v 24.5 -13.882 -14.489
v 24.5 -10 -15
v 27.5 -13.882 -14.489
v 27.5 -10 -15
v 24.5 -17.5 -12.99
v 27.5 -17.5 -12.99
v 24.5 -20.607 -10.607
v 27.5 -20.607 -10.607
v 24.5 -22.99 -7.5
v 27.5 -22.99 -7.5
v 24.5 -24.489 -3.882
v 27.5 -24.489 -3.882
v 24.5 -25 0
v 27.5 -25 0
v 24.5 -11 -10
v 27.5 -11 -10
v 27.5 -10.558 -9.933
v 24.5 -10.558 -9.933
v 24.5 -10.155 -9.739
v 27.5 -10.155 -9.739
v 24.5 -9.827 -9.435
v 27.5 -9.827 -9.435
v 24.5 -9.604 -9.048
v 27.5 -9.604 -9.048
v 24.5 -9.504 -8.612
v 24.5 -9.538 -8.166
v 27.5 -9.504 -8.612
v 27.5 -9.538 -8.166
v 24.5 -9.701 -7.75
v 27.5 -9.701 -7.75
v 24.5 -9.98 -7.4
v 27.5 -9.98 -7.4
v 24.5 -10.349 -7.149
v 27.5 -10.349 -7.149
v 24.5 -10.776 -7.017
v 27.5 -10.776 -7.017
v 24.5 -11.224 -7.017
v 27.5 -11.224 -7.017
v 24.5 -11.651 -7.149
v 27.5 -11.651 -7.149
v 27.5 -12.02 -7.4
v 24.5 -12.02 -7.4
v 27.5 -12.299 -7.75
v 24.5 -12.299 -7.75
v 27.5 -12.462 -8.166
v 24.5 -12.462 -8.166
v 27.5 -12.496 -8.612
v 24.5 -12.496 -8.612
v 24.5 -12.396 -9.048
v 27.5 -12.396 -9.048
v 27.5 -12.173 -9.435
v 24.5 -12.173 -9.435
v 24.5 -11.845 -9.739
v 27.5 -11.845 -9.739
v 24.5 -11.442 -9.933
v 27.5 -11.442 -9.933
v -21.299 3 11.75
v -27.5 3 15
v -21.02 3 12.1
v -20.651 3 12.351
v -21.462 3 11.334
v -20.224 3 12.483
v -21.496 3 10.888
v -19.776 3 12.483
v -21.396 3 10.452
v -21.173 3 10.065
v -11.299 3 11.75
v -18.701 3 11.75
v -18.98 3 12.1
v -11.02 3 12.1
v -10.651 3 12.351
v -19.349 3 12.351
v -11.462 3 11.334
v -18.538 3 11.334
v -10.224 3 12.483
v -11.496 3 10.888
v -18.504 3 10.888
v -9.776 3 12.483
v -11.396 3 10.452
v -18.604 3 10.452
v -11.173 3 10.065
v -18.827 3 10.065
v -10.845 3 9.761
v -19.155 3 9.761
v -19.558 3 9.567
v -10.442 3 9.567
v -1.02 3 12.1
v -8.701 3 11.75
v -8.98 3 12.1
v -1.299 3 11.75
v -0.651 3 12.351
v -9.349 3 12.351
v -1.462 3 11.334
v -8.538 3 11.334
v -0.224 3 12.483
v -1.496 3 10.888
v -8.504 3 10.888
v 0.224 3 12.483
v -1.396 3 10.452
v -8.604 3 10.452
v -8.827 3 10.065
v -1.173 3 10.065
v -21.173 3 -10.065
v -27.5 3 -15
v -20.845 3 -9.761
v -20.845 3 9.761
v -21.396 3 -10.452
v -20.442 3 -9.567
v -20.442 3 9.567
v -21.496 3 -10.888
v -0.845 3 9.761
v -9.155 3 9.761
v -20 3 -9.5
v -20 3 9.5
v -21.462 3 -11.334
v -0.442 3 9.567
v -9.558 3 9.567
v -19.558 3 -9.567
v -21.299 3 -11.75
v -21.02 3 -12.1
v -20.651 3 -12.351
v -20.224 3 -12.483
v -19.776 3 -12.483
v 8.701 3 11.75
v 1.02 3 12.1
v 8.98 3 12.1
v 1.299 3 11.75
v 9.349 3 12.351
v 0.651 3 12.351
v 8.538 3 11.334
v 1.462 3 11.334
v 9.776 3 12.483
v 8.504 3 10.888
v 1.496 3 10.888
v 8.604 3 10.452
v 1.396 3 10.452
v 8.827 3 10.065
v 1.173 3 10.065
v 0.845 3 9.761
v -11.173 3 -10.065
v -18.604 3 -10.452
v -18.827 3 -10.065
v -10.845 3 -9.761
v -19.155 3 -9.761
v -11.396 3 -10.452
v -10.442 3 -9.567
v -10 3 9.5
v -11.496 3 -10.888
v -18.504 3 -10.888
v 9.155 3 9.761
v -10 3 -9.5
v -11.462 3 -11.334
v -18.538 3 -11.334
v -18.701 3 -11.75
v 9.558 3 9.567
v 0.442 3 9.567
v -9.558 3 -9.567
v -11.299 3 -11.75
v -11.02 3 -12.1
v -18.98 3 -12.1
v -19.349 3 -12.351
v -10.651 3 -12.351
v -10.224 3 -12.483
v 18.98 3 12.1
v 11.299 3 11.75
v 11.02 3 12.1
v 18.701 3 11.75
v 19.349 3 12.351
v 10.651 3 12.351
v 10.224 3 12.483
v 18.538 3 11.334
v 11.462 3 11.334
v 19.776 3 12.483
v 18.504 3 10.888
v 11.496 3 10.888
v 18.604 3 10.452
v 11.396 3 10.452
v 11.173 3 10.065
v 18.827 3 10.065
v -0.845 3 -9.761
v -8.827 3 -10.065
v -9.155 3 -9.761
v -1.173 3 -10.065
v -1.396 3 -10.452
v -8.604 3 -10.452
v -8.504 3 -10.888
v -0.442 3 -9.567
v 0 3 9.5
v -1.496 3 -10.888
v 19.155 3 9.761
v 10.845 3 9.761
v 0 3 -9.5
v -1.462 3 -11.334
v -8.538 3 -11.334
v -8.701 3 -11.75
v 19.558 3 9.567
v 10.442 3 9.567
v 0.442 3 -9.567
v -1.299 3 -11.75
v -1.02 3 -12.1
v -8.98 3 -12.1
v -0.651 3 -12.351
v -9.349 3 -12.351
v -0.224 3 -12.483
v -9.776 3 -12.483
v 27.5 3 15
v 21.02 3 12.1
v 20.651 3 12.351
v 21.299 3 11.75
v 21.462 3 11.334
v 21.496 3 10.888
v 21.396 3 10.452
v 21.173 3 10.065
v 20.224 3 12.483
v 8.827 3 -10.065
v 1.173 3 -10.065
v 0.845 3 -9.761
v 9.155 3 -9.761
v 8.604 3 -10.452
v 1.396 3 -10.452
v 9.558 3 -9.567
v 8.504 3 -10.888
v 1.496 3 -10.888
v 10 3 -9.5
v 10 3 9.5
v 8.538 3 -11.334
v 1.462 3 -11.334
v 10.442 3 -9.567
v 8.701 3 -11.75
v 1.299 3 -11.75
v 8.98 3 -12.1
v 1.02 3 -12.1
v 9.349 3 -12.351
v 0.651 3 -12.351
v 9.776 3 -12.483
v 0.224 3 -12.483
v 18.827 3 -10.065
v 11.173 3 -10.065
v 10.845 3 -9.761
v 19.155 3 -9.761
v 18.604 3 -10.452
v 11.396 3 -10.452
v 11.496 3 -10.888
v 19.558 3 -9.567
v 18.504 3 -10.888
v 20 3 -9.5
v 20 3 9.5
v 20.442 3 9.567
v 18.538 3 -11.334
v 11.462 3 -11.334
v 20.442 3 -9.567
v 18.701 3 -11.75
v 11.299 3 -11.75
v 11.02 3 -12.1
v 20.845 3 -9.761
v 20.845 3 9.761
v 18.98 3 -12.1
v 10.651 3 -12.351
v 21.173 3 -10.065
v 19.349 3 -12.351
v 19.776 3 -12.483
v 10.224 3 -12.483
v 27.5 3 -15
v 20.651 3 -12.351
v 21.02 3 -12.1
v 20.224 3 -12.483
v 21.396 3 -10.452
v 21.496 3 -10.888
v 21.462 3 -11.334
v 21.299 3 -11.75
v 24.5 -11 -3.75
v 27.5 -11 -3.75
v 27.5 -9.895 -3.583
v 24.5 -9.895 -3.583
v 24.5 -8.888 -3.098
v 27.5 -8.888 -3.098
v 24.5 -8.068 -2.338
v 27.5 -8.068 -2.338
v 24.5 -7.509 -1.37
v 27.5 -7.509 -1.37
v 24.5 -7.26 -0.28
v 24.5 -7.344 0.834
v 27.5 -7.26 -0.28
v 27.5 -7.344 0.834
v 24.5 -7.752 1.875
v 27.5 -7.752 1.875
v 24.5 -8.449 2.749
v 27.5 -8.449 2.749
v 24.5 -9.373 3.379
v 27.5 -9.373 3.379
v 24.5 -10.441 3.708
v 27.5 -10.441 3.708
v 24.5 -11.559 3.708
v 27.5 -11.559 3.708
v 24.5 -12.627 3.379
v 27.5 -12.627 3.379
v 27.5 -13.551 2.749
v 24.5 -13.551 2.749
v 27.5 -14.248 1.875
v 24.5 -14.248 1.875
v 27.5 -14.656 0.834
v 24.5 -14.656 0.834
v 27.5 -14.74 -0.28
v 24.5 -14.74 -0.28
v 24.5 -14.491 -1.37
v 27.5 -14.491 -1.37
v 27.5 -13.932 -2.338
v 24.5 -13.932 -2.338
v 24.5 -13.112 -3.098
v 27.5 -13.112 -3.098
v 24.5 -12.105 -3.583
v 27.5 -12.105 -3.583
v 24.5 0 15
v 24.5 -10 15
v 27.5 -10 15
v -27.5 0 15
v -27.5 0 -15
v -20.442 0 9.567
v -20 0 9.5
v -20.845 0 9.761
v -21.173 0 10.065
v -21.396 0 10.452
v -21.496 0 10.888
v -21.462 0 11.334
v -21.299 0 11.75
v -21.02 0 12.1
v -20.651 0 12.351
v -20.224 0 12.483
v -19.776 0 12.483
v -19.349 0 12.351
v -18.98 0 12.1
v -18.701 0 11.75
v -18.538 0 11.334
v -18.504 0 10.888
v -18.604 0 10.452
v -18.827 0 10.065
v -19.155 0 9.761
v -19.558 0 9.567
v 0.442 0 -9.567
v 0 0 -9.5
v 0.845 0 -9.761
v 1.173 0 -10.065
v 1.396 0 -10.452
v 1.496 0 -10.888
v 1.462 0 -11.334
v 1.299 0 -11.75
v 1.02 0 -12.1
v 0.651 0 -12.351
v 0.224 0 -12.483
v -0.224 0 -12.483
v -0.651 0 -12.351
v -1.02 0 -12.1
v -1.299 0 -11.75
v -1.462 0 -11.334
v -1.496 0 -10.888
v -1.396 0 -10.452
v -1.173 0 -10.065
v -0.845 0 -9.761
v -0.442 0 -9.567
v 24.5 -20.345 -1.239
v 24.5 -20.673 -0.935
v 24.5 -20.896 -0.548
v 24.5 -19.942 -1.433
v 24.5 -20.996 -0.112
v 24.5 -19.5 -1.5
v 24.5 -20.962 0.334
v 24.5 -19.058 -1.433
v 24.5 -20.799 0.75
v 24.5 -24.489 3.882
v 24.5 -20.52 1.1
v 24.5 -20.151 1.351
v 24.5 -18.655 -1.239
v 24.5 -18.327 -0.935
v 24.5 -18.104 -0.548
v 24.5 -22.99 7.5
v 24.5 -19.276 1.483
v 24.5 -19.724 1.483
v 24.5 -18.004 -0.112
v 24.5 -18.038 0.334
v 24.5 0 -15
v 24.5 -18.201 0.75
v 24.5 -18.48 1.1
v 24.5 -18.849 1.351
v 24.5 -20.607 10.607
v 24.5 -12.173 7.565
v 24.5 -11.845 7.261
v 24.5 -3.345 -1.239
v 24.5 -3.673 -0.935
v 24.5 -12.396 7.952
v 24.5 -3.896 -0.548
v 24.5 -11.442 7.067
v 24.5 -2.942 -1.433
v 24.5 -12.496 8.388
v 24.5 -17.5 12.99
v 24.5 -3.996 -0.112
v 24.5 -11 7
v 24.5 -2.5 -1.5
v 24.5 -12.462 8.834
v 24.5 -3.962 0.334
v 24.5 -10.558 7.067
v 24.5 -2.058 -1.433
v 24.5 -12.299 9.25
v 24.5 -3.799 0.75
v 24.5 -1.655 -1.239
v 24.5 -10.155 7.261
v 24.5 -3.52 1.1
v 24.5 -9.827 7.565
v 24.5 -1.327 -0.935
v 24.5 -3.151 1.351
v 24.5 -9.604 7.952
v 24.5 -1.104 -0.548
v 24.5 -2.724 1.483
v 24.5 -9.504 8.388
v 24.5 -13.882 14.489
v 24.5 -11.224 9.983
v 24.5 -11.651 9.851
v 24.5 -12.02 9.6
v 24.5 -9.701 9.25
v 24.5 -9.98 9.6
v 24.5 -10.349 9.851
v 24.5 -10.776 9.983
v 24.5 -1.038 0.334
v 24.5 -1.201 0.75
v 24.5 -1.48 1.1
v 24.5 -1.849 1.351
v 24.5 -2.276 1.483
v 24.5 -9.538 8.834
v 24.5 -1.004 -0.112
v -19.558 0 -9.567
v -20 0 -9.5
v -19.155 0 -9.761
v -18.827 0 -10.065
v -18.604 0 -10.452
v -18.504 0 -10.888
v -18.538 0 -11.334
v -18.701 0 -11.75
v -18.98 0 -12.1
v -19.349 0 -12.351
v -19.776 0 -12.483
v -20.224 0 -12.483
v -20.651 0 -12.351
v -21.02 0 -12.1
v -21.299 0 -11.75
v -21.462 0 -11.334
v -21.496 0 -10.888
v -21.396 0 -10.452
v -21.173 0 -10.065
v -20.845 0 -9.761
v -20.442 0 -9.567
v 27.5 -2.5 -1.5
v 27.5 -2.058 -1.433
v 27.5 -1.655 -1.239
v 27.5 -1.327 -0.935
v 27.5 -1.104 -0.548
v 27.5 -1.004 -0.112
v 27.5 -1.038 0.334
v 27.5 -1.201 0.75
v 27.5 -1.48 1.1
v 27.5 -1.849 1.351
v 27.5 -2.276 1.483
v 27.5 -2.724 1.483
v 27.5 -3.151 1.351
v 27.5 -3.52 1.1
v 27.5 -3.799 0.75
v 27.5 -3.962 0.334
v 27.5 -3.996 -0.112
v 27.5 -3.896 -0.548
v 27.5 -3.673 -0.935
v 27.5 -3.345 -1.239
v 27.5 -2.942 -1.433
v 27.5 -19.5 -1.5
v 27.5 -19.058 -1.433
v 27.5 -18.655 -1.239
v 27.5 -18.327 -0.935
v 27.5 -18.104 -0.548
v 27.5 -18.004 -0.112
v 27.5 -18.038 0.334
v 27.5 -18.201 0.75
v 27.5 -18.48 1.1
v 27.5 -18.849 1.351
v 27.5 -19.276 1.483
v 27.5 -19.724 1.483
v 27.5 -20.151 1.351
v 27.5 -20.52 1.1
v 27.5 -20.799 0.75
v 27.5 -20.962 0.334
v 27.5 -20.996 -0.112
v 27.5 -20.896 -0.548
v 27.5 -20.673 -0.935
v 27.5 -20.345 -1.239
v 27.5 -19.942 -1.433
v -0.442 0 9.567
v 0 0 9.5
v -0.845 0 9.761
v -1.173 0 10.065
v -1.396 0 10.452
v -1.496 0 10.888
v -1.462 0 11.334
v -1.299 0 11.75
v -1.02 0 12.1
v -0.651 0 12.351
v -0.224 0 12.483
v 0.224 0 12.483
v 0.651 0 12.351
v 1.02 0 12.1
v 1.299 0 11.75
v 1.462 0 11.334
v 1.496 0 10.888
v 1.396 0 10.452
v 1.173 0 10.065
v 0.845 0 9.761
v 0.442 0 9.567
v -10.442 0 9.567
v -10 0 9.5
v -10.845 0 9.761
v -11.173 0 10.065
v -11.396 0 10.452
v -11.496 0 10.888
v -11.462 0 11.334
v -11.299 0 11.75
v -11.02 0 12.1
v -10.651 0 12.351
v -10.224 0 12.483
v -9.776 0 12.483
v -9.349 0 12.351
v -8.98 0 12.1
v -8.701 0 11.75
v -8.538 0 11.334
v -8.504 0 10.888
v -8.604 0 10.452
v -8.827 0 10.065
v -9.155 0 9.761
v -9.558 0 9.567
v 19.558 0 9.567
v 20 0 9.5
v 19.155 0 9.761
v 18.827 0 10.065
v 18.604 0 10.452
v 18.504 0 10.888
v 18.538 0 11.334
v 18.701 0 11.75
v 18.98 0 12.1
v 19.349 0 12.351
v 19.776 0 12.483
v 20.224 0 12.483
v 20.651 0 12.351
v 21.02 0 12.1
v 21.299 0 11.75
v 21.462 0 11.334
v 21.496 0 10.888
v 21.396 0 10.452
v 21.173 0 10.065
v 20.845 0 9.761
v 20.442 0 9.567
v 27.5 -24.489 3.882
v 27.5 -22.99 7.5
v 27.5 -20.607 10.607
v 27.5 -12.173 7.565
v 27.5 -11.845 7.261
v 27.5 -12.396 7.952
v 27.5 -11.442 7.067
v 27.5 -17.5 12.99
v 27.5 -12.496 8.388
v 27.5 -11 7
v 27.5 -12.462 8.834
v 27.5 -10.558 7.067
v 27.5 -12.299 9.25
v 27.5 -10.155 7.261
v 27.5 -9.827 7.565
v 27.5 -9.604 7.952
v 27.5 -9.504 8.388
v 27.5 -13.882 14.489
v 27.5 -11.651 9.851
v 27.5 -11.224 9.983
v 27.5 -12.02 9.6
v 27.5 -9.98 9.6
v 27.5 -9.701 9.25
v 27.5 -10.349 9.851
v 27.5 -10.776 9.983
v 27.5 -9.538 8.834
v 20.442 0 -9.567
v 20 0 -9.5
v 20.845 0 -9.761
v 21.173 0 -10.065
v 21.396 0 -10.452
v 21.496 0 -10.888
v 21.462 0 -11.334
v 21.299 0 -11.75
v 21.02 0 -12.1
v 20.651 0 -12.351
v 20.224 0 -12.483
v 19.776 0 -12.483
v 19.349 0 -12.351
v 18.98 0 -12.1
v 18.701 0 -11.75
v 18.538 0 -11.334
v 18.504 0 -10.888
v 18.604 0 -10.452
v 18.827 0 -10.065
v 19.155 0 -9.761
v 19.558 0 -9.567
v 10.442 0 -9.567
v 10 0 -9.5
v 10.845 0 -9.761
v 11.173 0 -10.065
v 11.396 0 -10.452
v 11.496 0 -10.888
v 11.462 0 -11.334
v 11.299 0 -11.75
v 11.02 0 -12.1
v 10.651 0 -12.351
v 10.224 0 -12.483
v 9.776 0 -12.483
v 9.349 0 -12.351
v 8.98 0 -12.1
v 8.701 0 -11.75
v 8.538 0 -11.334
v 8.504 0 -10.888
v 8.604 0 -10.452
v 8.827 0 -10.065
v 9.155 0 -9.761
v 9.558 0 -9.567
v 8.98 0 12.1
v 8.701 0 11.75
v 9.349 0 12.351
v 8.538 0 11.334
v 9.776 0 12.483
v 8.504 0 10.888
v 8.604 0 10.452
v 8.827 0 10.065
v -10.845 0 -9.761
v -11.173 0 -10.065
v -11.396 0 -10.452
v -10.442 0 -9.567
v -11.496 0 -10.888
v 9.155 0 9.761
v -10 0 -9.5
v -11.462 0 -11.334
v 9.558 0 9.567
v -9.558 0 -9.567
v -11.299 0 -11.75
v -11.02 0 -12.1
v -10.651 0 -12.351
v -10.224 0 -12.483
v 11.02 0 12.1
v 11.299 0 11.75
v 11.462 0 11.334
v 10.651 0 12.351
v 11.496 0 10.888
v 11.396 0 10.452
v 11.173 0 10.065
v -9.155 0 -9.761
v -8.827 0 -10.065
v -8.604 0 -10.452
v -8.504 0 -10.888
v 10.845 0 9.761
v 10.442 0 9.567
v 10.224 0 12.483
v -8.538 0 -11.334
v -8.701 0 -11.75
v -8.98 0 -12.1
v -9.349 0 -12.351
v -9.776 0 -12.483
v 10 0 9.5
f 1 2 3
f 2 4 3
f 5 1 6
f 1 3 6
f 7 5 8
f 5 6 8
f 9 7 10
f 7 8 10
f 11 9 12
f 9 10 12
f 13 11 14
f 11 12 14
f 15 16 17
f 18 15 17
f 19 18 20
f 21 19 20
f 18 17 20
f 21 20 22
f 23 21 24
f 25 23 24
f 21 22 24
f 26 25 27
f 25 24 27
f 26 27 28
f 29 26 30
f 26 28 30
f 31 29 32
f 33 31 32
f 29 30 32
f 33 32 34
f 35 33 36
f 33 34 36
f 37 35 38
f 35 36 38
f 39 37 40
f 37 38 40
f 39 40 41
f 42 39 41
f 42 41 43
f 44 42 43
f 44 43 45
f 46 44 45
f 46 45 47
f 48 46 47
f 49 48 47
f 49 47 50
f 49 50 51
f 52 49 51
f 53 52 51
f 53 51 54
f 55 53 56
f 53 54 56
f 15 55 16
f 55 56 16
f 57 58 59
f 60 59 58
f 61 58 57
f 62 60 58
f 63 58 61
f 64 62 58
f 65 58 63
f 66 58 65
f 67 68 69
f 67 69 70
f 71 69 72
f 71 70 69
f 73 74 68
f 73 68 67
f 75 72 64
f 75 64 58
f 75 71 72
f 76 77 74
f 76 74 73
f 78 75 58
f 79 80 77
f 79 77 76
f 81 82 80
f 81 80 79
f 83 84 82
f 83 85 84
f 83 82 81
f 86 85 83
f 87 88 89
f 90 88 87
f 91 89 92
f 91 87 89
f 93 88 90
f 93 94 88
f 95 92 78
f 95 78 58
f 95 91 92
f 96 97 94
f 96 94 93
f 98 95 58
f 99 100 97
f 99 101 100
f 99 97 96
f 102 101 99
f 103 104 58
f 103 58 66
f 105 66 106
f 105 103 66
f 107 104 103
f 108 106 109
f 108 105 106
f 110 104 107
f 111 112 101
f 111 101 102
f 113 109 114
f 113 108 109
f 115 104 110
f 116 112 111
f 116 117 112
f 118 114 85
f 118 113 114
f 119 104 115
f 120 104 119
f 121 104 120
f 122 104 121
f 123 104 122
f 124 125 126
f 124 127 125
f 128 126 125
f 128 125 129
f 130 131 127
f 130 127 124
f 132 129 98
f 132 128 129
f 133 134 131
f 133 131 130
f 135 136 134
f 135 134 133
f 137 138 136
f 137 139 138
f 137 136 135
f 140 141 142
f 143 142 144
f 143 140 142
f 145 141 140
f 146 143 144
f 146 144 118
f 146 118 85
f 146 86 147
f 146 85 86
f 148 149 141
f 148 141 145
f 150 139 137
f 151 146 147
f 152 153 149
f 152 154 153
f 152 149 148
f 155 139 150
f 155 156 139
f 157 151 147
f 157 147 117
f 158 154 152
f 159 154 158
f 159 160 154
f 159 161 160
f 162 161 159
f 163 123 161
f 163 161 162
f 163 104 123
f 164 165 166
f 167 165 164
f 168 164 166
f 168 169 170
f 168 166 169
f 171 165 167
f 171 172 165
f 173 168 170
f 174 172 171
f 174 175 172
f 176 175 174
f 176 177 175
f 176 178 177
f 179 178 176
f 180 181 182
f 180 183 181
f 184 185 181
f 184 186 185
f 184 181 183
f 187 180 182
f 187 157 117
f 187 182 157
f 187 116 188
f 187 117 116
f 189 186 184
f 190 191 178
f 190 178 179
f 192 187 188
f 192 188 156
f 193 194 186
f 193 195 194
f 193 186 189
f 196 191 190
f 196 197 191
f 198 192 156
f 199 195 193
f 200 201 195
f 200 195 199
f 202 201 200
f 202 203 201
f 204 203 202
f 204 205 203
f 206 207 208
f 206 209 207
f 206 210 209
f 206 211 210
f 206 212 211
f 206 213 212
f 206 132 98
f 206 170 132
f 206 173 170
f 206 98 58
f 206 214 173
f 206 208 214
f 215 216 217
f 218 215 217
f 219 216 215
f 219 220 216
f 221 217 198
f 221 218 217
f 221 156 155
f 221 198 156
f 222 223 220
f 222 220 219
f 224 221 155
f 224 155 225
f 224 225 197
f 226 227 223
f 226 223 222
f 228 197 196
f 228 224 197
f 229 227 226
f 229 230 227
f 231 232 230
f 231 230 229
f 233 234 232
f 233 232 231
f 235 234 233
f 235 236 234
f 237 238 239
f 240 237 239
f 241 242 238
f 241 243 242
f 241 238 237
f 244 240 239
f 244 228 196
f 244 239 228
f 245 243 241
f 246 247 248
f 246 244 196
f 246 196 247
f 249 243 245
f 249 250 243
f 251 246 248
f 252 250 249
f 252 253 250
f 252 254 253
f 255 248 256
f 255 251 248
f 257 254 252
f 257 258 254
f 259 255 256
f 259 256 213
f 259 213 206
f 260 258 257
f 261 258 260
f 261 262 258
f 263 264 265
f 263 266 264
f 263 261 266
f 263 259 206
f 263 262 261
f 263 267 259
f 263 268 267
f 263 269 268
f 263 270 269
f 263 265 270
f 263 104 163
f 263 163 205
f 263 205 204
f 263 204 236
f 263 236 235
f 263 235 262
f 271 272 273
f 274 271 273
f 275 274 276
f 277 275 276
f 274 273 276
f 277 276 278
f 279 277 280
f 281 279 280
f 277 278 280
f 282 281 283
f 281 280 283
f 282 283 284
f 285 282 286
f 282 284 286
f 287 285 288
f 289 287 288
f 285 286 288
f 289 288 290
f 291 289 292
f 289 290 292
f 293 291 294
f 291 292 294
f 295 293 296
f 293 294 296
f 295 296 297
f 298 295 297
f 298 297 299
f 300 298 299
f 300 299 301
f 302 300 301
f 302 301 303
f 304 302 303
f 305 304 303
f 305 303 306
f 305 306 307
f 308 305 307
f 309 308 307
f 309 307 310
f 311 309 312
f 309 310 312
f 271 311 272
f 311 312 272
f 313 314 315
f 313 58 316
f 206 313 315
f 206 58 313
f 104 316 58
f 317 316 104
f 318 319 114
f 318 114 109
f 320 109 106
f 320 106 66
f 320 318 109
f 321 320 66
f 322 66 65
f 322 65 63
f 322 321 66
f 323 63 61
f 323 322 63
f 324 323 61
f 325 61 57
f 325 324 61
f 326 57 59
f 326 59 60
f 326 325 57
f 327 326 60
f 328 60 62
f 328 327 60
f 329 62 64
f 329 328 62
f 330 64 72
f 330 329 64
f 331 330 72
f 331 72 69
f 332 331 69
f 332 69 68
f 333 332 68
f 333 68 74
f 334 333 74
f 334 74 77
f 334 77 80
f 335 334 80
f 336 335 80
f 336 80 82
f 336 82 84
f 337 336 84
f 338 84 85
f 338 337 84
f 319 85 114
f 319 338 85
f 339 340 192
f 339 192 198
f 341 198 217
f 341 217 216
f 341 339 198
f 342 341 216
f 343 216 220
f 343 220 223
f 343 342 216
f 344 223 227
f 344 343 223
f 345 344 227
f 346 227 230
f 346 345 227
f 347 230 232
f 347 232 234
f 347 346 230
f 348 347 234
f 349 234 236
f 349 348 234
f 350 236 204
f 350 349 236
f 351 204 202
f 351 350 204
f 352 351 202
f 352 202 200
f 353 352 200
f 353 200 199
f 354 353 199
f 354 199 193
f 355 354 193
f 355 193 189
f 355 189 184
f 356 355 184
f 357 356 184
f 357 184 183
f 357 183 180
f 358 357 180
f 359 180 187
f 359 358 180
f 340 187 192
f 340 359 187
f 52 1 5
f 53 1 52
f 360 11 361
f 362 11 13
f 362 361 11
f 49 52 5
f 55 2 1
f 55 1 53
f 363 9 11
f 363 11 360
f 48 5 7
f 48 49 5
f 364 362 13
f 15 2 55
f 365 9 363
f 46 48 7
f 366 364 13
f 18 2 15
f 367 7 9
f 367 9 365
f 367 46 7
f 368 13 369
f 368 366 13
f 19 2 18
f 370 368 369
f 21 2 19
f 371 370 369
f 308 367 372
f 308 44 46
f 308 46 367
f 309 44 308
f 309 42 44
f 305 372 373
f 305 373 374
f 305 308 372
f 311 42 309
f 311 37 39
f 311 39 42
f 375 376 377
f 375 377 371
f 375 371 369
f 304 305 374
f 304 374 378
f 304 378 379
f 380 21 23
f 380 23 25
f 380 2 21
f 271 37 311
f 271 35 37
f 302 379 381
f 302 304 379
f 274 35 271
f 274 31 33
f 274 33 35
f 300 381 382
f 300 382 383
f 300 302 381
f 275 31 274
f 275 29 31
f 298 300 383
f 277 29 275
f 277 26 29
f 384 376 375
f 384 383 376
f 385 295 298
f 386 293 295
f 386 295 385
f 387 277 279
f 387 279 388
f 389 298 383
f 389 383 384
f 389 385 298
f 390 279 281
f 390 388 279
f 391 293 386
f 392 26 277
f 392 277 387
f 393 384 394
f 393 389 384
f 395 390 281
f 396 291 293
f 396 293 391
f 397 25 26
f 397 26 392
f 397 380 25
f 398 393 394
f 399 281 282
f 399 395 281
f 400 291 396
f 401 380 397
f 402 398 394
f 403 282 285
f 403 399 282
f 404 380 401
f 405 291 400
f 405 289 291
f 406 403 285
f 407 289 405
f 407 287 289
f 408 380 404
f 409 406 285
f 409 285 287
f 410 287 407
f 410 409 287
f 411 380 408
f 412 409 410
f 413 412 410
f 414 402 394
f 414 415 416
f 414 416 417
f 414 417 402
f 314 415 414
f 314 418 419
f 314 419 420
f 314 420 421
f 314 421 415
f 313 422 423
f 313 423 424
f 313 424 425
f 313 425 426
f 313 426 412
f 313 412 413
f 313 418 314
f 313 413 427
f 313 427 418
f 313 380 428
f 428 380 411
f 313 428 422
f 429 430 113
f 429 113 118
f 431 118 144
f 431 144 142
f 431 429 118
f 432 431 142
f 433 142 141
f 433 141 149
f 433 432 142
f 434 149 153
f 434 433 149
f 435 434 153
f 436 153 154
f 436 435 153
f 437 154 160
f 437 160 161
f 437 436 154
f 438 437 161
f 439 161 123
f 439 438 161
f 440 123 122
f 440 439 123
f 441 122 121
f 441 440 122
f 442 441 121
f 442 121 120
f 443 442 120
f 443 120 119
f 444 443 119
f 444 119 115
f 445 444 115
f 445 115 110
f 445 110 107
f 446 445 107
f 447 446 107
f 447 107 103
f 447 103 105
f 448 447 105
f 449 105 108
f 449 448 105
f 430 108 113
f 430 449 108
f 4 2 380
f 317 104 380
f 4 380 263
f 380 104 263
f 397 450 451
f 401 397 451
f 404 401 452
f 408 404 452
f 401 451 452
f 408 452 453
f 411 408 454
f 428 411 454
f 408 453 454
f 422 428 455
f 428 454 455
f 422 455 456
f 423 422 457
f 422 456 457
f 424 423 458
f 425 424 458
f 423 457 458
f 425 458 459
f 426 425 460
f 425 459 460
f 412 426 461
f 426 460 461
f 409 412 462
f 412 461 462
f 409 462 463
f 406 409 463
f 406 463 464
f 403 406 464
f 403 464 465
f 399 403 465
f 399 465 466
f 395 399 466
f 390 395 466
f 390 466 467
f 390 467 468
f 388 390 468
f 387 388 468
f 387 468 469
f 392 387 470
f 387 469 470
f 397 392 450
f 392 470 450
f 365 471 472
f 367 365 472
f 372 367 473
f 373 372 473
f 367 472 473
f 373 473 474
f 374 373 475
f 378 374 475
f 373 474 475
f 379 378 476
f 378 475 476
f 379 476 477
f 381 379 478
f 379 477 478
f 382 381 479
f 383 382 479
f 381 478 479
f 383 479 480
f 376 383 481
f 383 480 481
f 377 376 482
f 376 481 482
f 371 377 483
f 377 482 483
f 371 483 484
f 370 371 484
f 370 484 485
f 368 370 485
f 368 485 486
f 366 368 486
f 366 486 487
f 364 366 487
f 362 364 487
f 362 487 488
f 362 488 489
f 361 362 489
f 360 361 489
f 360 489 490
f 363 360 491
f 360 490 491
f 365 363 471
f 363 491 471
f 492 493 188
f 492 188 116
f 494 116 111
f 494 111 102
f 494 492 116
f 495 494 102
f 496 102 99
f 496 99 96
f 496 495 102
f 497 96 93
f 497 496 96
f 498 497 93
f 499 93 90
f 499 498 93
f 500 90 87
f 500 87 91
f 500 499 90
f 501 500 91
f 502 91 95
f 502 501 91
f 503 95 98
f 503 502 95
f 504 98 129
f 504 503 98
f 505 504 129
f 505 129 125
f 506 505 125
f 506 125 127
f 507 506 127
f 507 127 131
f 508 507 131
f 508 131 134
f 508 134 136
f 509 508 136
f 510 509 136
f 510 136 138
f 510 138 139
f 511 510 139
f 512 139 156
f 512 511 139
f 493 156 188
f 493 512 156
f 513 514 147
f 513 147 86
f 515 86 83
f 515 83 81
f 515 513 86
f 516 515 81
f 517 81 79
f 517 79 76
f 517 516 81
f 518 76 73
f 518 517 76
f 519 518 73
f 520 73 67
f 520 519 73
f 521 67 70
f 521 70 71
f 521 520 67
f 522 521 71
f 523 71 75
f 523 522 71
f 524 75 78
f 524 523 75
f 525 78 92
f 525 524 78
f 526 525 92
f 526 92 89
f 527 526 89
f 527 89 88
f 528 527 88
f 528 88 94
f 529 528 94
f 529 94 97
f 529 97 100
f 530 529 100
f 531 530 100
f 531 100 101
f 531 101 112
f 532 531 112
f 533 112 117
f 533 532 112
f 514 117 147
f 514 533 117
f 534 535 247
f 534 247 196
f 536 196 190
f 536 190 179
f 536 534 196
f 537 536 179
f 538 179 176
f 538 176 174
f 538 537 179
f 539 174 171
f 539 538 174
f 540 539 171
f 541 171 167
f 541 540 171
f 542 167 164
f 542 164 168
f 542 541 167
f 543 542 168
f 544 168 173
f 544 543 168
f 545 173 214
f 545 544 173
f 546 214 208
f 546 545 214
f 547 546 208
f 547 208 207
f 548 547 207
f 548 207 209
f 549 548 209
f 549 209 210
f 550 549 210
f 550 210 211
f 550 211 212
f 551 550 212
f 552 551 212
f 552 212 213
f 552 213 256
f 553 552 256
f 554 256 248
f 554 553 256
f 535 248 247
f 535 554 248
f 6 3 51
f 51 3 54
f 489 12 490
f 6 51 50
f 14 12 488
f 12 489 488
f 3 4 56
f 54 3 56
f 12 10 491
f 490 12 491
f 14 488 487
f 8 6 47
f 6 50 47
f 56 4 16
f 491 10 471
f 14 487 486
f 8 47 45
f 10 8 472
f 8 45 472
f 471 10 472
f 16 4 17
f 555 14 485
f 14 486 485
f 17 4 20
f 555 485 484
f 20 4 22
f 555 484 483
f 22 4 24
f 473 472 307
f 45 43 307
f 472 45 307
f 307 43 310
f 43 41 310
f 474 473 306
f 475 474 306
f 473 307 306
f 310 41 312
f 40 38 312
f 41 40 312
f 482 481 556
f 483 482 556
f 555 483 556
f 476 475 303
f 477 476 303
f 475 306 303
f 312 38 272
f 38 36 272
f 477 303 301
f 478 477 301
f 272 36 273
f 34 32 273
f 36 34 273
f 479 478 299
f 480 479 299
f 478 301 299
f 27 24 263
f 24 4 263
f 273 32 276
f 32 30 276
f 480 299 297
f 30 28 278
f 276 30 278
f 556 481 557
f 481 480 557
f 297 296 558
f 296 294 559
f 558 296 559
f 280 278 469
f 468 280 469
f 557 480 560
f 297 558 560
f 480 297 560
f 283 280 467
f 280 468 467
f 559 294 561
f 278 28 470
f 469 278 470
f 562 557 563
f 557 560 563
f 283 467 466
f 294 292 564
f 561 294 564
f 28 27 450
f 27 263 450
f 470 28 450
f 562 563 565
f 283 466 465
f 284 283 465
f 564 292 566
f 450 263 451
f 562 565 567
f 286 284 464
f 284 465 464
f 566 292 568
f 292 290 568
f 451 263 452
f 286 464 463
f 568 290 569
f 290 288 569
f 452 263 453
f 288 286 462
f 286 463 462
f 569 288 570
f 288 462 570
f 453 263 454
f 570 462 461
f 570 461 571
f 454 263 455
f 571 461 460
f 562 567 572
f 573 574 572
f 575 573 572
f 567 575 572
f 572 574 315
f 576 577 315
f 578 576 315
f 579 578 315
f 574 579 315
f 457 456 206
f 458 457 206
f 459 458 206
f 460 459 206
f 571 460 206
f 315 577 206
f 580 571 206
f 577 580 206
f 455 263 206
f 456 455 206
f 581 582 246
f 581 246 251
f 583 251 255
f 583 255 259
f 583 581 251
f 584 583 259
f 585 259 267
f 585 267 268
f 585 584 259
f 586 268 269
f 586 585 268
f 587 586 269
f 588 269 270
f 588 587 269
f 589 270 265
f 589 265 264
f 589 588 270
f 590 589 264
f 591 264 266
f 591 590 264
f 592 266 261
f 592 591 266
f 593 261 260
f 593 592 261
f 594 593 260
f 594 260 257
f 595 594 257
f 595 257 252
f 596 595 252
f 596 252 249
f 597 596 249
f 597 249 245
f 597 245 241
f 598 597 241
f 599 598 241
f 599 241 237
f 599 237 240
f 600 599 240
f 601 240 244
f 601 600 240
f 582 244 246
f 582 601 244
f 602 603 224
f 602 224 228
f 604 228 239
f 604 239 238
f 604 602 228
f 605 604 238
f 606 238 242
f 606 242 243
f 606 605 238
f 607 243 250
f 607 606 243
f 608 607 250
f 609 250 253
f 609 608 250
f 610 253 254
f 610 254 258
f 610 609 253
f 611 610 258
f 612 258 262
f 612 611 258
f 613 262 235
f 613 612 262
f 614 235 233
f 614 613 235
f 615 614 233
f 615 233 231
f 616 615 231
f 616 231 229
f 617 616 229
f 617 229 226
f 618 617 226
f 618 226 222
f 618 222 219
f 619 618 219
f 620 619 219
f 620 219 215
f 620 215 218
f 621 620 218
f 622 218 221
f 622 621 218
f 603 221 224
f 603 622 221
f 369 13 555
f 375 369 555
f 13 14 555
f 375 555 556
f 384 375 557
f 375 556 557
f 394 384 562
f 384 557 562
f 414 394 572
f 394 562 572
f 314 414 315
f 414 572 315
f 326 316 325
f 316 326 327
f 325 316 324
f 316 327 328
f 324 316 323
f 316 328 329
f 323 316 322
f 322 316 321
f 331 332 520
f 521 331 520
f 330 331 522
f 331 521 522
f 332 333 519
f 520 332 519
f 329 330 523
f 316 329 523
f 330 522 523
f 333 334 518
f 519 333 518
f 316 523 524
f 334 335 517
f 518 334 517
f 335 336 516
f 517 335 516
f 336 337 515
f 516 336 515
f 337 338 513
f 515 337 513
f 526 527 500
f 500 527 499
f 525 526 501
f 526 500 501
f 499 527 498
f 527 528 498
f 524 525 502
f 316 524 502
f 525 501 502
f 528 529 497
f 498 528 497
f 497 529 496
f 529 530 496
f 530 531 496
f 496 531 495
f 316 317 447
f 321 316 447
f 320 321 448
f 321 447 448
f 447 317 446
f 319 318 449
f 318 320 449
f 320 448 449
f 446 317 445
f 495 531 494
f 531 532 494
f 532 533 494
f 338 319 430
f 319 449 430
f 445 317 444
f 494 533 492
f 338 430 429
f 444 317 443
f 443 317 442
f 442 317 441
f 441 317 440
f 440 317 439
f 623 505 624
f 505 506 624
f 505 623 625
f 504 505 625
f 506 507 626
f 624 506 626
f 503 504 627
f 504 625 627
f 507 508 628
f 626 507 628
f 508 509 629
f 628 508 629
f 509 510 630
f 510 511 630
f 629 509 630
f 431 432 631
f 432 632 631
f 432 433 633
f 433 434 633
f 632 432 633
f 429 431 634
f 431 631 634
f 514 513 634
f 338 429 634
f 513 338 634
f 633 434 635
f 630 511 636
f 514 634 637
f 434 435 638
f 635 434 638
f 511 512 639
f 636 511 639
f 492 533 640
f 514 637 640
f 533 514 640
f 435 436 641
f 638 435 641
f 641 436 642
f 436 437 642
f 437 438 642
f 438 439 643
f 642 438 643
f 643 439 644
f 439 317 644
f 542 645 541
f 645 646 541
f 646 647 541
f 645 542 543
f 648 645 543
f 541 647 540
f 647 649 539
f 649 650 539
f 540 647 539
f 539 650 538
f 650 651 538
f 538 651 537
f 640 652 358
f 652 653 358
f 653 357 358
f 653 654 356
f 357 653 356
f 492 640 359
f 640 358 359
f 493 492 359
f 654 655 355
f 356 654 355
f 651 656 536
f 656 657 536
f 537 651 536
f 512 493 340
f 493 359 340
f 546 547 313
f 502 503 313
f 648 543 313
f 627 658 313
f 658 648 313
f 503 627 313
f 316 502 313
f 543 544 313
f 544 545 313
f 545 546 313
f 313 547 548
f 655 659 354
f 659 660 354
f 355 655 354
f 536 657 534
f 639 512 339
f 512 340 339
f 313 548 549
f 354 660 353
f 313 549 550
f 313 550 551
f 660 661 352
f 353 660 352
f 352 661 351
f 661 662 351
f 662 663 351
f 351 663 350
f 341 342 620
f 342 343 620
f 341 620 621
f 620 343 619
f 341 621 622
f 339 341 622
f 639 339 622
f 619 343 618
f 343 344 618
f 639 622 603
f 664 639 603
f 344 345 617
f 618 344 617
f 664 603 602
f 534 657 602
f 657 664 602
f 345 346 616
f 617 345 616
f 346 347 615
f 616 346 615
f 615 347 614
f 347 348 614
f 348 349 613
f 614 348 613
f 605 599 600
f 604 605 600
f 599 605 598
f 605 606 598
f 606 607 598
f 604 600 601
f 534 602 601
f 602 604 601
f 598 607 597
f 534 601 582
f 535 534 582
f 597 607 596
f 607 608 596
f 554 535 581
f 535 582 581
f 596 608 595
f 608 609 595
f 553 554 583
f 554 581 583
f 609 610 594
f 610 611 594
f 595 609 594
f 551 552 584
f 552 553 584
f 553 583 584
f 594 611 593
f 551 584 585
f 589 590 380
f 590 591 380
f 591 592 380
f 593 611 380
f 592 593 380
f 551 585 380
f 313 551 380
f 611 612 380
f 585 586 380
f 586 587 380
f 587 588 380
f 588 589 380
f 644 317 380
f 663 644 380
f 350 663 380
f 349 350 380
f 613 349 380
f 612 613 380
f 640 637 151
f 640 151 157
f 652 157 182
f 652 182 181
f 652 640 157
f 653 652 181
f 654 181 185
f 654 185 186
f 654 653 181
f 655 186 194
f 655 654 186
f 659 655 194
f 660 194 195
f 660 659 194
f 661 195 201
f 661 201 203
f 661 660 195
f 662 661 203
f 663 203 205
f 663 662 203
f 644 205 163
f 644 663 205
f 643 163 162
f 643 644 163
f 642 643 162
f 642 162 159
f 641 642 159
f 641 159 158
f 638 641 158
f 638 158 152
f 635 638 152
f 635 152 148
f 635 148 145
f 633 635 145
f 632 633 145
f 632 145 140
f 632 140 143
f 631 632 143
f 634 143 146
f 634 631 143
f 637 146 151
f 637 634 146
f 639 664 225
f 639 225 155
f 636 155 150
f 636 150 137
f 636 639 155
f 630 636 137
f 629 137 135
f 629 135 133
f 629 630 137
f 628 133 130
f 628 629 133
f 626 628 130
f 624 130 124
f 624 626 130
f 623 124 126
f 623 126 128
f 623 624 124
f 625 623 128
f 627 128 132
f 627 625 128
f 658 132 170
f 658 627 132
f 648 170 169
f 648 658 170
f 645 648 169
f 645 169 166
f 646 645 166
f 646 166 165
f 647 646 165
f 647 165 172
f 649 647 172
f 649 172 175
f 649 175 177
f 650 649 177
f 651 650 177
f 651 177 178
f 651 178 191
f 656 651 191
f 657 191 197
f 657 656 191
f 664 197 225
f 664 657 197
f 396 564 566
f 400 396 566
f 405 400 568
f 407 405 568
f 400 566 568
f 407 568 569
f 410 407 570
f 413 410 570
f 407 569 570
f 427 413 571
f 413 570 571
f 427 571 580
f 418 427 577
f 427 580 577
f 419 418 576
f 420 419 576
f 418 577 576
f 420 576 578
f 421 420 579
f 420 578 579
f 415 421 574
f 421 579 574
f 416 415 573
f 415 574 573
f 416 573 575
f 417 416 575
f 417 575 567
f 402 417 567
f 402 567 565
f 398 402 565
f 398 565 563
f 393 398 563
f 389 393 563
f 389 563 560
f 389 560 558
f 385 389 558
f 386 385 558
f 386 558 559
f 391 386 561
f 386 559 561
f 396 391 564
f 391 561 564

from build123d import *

# Parameters (mm, degrees)
SKETCH1_W           = 55
SKETCH1_H           = 30
SKETCH1_R           = 1.5
BOSS_EXTRUDE1_DEPTH = 3
SKETCH2_W           = 3
SKETCH2_H           = 30
BOSS_EXTRUDE2_DEPTH = 25
SKETCH3_R           = 1.5
SKETCH3_R_2         = 3.75
CUT_EXTRUDE1_DEPTH  = 3
FILLET1_R           = 15


with BuildPart() as part:
    # Sketch1 → Boss-Extrude1 (new body)
    with BuildSketch(Plane(origin=(0, 0, 0), x_dir=(1, 0, 0), z_dir=(0, 1, 0))):
        Rectangle(SKETCH1_W, SKETCH1_H)
        with Locations(Location((20, 11, 0), (0, 0, 270))):
            Circle(SKETCH1_R, mode=Mode.SUBTRACT)
        with Locations(Location((10, 11, 0), (0, 0, 270))):
            Circle(SKETCH1_R, mode=Mode.SUBTRACT)
        with Locations(Location((0, 11, 0), (0, 0, 270))):
            Circle(SKETCH1_R, mode=Mode.SUBTRACT)
        with Locations(Location((-10, 11, 0), (0, 0, 270))):
            Circle(SKETCH1_R, mode=Mode.SUBTRACT)
        with Locations(Location((-20, 11, 0), (0, 0, 270))):
            Circle(SKETCH1_R, mode=Mode.SUBTRACT)
        with Locations(Location((20, -11, 0), (0, 0, 90))):
            Circle(SKETCH1_R, mode=Mode.SUBTRACT)
        with Locations(Location((10, -11, 0), (0, 0, 90))):
            Circle(SKETCH1_R, mode=Mode.SUBTRACT)
        with Locations(Location((0, -11, 0), (0, 0, 90))):
            Circle(SKETCH1_R, mode=Mode.SUBTRACT)
        with Locations(Location((-10, -11, 0), (0, 0, 90))):
            Circle(SKETCH1_R, mode=Mode.SUBTRACT)
        with Locations(Location((-20, -11, 0), (0, 0, 90))):
            Circle(SKETCH1_R, mode=Mode.SUBTRACT)
    extrude(amount=BOSS_EXTRUDE1_DEPTH)

    # Sketch2 → Boss-Extrude2 (add)
    with BuildSketch(Plane.XZ):
        with Locations((26, 0)):
            Rectangle(SKETCH2_W, SKETCH2_H)
    extrude(amount=BOSS_EXTRUDE2_DEPTH)

    # Sketch3 → Cut-Extrude1 (cut)
    with BuildSketch(Plane(origin=(27.5, 0, 0), x_dir=(0, 0, -1), z_dir=(1, 0, 0))):
        with Locations((0, -19.5)):
            Circle(SKETCH3_R)
        with Locations((-8.5, -11)):
            Circle(SKETCH3_R)
        with Locations((0, -2.5)):
            Circle(SKETCH3_R)
        with Locations((8.5, -11)):
            Circle(SKETCH3_R)
        with Locations((0, -11)):
            Circle(SKETCH3_R_2)
    extrude(amount=-CUT_EXTRUDE1_DEPTH, mode=Mode.SUBTRACT)

    # Fillet1
    fillet1_edges = [part.edges().sort_by_distance(p)[0] for p in [
        (26, -25, -15),
        (26, -25, 15),
    ]]
    fillet(fillet1_edges, radius=FILLET1_R - 0.0001)  # a hair under: the kernel refuses the full size


solid = part.part
